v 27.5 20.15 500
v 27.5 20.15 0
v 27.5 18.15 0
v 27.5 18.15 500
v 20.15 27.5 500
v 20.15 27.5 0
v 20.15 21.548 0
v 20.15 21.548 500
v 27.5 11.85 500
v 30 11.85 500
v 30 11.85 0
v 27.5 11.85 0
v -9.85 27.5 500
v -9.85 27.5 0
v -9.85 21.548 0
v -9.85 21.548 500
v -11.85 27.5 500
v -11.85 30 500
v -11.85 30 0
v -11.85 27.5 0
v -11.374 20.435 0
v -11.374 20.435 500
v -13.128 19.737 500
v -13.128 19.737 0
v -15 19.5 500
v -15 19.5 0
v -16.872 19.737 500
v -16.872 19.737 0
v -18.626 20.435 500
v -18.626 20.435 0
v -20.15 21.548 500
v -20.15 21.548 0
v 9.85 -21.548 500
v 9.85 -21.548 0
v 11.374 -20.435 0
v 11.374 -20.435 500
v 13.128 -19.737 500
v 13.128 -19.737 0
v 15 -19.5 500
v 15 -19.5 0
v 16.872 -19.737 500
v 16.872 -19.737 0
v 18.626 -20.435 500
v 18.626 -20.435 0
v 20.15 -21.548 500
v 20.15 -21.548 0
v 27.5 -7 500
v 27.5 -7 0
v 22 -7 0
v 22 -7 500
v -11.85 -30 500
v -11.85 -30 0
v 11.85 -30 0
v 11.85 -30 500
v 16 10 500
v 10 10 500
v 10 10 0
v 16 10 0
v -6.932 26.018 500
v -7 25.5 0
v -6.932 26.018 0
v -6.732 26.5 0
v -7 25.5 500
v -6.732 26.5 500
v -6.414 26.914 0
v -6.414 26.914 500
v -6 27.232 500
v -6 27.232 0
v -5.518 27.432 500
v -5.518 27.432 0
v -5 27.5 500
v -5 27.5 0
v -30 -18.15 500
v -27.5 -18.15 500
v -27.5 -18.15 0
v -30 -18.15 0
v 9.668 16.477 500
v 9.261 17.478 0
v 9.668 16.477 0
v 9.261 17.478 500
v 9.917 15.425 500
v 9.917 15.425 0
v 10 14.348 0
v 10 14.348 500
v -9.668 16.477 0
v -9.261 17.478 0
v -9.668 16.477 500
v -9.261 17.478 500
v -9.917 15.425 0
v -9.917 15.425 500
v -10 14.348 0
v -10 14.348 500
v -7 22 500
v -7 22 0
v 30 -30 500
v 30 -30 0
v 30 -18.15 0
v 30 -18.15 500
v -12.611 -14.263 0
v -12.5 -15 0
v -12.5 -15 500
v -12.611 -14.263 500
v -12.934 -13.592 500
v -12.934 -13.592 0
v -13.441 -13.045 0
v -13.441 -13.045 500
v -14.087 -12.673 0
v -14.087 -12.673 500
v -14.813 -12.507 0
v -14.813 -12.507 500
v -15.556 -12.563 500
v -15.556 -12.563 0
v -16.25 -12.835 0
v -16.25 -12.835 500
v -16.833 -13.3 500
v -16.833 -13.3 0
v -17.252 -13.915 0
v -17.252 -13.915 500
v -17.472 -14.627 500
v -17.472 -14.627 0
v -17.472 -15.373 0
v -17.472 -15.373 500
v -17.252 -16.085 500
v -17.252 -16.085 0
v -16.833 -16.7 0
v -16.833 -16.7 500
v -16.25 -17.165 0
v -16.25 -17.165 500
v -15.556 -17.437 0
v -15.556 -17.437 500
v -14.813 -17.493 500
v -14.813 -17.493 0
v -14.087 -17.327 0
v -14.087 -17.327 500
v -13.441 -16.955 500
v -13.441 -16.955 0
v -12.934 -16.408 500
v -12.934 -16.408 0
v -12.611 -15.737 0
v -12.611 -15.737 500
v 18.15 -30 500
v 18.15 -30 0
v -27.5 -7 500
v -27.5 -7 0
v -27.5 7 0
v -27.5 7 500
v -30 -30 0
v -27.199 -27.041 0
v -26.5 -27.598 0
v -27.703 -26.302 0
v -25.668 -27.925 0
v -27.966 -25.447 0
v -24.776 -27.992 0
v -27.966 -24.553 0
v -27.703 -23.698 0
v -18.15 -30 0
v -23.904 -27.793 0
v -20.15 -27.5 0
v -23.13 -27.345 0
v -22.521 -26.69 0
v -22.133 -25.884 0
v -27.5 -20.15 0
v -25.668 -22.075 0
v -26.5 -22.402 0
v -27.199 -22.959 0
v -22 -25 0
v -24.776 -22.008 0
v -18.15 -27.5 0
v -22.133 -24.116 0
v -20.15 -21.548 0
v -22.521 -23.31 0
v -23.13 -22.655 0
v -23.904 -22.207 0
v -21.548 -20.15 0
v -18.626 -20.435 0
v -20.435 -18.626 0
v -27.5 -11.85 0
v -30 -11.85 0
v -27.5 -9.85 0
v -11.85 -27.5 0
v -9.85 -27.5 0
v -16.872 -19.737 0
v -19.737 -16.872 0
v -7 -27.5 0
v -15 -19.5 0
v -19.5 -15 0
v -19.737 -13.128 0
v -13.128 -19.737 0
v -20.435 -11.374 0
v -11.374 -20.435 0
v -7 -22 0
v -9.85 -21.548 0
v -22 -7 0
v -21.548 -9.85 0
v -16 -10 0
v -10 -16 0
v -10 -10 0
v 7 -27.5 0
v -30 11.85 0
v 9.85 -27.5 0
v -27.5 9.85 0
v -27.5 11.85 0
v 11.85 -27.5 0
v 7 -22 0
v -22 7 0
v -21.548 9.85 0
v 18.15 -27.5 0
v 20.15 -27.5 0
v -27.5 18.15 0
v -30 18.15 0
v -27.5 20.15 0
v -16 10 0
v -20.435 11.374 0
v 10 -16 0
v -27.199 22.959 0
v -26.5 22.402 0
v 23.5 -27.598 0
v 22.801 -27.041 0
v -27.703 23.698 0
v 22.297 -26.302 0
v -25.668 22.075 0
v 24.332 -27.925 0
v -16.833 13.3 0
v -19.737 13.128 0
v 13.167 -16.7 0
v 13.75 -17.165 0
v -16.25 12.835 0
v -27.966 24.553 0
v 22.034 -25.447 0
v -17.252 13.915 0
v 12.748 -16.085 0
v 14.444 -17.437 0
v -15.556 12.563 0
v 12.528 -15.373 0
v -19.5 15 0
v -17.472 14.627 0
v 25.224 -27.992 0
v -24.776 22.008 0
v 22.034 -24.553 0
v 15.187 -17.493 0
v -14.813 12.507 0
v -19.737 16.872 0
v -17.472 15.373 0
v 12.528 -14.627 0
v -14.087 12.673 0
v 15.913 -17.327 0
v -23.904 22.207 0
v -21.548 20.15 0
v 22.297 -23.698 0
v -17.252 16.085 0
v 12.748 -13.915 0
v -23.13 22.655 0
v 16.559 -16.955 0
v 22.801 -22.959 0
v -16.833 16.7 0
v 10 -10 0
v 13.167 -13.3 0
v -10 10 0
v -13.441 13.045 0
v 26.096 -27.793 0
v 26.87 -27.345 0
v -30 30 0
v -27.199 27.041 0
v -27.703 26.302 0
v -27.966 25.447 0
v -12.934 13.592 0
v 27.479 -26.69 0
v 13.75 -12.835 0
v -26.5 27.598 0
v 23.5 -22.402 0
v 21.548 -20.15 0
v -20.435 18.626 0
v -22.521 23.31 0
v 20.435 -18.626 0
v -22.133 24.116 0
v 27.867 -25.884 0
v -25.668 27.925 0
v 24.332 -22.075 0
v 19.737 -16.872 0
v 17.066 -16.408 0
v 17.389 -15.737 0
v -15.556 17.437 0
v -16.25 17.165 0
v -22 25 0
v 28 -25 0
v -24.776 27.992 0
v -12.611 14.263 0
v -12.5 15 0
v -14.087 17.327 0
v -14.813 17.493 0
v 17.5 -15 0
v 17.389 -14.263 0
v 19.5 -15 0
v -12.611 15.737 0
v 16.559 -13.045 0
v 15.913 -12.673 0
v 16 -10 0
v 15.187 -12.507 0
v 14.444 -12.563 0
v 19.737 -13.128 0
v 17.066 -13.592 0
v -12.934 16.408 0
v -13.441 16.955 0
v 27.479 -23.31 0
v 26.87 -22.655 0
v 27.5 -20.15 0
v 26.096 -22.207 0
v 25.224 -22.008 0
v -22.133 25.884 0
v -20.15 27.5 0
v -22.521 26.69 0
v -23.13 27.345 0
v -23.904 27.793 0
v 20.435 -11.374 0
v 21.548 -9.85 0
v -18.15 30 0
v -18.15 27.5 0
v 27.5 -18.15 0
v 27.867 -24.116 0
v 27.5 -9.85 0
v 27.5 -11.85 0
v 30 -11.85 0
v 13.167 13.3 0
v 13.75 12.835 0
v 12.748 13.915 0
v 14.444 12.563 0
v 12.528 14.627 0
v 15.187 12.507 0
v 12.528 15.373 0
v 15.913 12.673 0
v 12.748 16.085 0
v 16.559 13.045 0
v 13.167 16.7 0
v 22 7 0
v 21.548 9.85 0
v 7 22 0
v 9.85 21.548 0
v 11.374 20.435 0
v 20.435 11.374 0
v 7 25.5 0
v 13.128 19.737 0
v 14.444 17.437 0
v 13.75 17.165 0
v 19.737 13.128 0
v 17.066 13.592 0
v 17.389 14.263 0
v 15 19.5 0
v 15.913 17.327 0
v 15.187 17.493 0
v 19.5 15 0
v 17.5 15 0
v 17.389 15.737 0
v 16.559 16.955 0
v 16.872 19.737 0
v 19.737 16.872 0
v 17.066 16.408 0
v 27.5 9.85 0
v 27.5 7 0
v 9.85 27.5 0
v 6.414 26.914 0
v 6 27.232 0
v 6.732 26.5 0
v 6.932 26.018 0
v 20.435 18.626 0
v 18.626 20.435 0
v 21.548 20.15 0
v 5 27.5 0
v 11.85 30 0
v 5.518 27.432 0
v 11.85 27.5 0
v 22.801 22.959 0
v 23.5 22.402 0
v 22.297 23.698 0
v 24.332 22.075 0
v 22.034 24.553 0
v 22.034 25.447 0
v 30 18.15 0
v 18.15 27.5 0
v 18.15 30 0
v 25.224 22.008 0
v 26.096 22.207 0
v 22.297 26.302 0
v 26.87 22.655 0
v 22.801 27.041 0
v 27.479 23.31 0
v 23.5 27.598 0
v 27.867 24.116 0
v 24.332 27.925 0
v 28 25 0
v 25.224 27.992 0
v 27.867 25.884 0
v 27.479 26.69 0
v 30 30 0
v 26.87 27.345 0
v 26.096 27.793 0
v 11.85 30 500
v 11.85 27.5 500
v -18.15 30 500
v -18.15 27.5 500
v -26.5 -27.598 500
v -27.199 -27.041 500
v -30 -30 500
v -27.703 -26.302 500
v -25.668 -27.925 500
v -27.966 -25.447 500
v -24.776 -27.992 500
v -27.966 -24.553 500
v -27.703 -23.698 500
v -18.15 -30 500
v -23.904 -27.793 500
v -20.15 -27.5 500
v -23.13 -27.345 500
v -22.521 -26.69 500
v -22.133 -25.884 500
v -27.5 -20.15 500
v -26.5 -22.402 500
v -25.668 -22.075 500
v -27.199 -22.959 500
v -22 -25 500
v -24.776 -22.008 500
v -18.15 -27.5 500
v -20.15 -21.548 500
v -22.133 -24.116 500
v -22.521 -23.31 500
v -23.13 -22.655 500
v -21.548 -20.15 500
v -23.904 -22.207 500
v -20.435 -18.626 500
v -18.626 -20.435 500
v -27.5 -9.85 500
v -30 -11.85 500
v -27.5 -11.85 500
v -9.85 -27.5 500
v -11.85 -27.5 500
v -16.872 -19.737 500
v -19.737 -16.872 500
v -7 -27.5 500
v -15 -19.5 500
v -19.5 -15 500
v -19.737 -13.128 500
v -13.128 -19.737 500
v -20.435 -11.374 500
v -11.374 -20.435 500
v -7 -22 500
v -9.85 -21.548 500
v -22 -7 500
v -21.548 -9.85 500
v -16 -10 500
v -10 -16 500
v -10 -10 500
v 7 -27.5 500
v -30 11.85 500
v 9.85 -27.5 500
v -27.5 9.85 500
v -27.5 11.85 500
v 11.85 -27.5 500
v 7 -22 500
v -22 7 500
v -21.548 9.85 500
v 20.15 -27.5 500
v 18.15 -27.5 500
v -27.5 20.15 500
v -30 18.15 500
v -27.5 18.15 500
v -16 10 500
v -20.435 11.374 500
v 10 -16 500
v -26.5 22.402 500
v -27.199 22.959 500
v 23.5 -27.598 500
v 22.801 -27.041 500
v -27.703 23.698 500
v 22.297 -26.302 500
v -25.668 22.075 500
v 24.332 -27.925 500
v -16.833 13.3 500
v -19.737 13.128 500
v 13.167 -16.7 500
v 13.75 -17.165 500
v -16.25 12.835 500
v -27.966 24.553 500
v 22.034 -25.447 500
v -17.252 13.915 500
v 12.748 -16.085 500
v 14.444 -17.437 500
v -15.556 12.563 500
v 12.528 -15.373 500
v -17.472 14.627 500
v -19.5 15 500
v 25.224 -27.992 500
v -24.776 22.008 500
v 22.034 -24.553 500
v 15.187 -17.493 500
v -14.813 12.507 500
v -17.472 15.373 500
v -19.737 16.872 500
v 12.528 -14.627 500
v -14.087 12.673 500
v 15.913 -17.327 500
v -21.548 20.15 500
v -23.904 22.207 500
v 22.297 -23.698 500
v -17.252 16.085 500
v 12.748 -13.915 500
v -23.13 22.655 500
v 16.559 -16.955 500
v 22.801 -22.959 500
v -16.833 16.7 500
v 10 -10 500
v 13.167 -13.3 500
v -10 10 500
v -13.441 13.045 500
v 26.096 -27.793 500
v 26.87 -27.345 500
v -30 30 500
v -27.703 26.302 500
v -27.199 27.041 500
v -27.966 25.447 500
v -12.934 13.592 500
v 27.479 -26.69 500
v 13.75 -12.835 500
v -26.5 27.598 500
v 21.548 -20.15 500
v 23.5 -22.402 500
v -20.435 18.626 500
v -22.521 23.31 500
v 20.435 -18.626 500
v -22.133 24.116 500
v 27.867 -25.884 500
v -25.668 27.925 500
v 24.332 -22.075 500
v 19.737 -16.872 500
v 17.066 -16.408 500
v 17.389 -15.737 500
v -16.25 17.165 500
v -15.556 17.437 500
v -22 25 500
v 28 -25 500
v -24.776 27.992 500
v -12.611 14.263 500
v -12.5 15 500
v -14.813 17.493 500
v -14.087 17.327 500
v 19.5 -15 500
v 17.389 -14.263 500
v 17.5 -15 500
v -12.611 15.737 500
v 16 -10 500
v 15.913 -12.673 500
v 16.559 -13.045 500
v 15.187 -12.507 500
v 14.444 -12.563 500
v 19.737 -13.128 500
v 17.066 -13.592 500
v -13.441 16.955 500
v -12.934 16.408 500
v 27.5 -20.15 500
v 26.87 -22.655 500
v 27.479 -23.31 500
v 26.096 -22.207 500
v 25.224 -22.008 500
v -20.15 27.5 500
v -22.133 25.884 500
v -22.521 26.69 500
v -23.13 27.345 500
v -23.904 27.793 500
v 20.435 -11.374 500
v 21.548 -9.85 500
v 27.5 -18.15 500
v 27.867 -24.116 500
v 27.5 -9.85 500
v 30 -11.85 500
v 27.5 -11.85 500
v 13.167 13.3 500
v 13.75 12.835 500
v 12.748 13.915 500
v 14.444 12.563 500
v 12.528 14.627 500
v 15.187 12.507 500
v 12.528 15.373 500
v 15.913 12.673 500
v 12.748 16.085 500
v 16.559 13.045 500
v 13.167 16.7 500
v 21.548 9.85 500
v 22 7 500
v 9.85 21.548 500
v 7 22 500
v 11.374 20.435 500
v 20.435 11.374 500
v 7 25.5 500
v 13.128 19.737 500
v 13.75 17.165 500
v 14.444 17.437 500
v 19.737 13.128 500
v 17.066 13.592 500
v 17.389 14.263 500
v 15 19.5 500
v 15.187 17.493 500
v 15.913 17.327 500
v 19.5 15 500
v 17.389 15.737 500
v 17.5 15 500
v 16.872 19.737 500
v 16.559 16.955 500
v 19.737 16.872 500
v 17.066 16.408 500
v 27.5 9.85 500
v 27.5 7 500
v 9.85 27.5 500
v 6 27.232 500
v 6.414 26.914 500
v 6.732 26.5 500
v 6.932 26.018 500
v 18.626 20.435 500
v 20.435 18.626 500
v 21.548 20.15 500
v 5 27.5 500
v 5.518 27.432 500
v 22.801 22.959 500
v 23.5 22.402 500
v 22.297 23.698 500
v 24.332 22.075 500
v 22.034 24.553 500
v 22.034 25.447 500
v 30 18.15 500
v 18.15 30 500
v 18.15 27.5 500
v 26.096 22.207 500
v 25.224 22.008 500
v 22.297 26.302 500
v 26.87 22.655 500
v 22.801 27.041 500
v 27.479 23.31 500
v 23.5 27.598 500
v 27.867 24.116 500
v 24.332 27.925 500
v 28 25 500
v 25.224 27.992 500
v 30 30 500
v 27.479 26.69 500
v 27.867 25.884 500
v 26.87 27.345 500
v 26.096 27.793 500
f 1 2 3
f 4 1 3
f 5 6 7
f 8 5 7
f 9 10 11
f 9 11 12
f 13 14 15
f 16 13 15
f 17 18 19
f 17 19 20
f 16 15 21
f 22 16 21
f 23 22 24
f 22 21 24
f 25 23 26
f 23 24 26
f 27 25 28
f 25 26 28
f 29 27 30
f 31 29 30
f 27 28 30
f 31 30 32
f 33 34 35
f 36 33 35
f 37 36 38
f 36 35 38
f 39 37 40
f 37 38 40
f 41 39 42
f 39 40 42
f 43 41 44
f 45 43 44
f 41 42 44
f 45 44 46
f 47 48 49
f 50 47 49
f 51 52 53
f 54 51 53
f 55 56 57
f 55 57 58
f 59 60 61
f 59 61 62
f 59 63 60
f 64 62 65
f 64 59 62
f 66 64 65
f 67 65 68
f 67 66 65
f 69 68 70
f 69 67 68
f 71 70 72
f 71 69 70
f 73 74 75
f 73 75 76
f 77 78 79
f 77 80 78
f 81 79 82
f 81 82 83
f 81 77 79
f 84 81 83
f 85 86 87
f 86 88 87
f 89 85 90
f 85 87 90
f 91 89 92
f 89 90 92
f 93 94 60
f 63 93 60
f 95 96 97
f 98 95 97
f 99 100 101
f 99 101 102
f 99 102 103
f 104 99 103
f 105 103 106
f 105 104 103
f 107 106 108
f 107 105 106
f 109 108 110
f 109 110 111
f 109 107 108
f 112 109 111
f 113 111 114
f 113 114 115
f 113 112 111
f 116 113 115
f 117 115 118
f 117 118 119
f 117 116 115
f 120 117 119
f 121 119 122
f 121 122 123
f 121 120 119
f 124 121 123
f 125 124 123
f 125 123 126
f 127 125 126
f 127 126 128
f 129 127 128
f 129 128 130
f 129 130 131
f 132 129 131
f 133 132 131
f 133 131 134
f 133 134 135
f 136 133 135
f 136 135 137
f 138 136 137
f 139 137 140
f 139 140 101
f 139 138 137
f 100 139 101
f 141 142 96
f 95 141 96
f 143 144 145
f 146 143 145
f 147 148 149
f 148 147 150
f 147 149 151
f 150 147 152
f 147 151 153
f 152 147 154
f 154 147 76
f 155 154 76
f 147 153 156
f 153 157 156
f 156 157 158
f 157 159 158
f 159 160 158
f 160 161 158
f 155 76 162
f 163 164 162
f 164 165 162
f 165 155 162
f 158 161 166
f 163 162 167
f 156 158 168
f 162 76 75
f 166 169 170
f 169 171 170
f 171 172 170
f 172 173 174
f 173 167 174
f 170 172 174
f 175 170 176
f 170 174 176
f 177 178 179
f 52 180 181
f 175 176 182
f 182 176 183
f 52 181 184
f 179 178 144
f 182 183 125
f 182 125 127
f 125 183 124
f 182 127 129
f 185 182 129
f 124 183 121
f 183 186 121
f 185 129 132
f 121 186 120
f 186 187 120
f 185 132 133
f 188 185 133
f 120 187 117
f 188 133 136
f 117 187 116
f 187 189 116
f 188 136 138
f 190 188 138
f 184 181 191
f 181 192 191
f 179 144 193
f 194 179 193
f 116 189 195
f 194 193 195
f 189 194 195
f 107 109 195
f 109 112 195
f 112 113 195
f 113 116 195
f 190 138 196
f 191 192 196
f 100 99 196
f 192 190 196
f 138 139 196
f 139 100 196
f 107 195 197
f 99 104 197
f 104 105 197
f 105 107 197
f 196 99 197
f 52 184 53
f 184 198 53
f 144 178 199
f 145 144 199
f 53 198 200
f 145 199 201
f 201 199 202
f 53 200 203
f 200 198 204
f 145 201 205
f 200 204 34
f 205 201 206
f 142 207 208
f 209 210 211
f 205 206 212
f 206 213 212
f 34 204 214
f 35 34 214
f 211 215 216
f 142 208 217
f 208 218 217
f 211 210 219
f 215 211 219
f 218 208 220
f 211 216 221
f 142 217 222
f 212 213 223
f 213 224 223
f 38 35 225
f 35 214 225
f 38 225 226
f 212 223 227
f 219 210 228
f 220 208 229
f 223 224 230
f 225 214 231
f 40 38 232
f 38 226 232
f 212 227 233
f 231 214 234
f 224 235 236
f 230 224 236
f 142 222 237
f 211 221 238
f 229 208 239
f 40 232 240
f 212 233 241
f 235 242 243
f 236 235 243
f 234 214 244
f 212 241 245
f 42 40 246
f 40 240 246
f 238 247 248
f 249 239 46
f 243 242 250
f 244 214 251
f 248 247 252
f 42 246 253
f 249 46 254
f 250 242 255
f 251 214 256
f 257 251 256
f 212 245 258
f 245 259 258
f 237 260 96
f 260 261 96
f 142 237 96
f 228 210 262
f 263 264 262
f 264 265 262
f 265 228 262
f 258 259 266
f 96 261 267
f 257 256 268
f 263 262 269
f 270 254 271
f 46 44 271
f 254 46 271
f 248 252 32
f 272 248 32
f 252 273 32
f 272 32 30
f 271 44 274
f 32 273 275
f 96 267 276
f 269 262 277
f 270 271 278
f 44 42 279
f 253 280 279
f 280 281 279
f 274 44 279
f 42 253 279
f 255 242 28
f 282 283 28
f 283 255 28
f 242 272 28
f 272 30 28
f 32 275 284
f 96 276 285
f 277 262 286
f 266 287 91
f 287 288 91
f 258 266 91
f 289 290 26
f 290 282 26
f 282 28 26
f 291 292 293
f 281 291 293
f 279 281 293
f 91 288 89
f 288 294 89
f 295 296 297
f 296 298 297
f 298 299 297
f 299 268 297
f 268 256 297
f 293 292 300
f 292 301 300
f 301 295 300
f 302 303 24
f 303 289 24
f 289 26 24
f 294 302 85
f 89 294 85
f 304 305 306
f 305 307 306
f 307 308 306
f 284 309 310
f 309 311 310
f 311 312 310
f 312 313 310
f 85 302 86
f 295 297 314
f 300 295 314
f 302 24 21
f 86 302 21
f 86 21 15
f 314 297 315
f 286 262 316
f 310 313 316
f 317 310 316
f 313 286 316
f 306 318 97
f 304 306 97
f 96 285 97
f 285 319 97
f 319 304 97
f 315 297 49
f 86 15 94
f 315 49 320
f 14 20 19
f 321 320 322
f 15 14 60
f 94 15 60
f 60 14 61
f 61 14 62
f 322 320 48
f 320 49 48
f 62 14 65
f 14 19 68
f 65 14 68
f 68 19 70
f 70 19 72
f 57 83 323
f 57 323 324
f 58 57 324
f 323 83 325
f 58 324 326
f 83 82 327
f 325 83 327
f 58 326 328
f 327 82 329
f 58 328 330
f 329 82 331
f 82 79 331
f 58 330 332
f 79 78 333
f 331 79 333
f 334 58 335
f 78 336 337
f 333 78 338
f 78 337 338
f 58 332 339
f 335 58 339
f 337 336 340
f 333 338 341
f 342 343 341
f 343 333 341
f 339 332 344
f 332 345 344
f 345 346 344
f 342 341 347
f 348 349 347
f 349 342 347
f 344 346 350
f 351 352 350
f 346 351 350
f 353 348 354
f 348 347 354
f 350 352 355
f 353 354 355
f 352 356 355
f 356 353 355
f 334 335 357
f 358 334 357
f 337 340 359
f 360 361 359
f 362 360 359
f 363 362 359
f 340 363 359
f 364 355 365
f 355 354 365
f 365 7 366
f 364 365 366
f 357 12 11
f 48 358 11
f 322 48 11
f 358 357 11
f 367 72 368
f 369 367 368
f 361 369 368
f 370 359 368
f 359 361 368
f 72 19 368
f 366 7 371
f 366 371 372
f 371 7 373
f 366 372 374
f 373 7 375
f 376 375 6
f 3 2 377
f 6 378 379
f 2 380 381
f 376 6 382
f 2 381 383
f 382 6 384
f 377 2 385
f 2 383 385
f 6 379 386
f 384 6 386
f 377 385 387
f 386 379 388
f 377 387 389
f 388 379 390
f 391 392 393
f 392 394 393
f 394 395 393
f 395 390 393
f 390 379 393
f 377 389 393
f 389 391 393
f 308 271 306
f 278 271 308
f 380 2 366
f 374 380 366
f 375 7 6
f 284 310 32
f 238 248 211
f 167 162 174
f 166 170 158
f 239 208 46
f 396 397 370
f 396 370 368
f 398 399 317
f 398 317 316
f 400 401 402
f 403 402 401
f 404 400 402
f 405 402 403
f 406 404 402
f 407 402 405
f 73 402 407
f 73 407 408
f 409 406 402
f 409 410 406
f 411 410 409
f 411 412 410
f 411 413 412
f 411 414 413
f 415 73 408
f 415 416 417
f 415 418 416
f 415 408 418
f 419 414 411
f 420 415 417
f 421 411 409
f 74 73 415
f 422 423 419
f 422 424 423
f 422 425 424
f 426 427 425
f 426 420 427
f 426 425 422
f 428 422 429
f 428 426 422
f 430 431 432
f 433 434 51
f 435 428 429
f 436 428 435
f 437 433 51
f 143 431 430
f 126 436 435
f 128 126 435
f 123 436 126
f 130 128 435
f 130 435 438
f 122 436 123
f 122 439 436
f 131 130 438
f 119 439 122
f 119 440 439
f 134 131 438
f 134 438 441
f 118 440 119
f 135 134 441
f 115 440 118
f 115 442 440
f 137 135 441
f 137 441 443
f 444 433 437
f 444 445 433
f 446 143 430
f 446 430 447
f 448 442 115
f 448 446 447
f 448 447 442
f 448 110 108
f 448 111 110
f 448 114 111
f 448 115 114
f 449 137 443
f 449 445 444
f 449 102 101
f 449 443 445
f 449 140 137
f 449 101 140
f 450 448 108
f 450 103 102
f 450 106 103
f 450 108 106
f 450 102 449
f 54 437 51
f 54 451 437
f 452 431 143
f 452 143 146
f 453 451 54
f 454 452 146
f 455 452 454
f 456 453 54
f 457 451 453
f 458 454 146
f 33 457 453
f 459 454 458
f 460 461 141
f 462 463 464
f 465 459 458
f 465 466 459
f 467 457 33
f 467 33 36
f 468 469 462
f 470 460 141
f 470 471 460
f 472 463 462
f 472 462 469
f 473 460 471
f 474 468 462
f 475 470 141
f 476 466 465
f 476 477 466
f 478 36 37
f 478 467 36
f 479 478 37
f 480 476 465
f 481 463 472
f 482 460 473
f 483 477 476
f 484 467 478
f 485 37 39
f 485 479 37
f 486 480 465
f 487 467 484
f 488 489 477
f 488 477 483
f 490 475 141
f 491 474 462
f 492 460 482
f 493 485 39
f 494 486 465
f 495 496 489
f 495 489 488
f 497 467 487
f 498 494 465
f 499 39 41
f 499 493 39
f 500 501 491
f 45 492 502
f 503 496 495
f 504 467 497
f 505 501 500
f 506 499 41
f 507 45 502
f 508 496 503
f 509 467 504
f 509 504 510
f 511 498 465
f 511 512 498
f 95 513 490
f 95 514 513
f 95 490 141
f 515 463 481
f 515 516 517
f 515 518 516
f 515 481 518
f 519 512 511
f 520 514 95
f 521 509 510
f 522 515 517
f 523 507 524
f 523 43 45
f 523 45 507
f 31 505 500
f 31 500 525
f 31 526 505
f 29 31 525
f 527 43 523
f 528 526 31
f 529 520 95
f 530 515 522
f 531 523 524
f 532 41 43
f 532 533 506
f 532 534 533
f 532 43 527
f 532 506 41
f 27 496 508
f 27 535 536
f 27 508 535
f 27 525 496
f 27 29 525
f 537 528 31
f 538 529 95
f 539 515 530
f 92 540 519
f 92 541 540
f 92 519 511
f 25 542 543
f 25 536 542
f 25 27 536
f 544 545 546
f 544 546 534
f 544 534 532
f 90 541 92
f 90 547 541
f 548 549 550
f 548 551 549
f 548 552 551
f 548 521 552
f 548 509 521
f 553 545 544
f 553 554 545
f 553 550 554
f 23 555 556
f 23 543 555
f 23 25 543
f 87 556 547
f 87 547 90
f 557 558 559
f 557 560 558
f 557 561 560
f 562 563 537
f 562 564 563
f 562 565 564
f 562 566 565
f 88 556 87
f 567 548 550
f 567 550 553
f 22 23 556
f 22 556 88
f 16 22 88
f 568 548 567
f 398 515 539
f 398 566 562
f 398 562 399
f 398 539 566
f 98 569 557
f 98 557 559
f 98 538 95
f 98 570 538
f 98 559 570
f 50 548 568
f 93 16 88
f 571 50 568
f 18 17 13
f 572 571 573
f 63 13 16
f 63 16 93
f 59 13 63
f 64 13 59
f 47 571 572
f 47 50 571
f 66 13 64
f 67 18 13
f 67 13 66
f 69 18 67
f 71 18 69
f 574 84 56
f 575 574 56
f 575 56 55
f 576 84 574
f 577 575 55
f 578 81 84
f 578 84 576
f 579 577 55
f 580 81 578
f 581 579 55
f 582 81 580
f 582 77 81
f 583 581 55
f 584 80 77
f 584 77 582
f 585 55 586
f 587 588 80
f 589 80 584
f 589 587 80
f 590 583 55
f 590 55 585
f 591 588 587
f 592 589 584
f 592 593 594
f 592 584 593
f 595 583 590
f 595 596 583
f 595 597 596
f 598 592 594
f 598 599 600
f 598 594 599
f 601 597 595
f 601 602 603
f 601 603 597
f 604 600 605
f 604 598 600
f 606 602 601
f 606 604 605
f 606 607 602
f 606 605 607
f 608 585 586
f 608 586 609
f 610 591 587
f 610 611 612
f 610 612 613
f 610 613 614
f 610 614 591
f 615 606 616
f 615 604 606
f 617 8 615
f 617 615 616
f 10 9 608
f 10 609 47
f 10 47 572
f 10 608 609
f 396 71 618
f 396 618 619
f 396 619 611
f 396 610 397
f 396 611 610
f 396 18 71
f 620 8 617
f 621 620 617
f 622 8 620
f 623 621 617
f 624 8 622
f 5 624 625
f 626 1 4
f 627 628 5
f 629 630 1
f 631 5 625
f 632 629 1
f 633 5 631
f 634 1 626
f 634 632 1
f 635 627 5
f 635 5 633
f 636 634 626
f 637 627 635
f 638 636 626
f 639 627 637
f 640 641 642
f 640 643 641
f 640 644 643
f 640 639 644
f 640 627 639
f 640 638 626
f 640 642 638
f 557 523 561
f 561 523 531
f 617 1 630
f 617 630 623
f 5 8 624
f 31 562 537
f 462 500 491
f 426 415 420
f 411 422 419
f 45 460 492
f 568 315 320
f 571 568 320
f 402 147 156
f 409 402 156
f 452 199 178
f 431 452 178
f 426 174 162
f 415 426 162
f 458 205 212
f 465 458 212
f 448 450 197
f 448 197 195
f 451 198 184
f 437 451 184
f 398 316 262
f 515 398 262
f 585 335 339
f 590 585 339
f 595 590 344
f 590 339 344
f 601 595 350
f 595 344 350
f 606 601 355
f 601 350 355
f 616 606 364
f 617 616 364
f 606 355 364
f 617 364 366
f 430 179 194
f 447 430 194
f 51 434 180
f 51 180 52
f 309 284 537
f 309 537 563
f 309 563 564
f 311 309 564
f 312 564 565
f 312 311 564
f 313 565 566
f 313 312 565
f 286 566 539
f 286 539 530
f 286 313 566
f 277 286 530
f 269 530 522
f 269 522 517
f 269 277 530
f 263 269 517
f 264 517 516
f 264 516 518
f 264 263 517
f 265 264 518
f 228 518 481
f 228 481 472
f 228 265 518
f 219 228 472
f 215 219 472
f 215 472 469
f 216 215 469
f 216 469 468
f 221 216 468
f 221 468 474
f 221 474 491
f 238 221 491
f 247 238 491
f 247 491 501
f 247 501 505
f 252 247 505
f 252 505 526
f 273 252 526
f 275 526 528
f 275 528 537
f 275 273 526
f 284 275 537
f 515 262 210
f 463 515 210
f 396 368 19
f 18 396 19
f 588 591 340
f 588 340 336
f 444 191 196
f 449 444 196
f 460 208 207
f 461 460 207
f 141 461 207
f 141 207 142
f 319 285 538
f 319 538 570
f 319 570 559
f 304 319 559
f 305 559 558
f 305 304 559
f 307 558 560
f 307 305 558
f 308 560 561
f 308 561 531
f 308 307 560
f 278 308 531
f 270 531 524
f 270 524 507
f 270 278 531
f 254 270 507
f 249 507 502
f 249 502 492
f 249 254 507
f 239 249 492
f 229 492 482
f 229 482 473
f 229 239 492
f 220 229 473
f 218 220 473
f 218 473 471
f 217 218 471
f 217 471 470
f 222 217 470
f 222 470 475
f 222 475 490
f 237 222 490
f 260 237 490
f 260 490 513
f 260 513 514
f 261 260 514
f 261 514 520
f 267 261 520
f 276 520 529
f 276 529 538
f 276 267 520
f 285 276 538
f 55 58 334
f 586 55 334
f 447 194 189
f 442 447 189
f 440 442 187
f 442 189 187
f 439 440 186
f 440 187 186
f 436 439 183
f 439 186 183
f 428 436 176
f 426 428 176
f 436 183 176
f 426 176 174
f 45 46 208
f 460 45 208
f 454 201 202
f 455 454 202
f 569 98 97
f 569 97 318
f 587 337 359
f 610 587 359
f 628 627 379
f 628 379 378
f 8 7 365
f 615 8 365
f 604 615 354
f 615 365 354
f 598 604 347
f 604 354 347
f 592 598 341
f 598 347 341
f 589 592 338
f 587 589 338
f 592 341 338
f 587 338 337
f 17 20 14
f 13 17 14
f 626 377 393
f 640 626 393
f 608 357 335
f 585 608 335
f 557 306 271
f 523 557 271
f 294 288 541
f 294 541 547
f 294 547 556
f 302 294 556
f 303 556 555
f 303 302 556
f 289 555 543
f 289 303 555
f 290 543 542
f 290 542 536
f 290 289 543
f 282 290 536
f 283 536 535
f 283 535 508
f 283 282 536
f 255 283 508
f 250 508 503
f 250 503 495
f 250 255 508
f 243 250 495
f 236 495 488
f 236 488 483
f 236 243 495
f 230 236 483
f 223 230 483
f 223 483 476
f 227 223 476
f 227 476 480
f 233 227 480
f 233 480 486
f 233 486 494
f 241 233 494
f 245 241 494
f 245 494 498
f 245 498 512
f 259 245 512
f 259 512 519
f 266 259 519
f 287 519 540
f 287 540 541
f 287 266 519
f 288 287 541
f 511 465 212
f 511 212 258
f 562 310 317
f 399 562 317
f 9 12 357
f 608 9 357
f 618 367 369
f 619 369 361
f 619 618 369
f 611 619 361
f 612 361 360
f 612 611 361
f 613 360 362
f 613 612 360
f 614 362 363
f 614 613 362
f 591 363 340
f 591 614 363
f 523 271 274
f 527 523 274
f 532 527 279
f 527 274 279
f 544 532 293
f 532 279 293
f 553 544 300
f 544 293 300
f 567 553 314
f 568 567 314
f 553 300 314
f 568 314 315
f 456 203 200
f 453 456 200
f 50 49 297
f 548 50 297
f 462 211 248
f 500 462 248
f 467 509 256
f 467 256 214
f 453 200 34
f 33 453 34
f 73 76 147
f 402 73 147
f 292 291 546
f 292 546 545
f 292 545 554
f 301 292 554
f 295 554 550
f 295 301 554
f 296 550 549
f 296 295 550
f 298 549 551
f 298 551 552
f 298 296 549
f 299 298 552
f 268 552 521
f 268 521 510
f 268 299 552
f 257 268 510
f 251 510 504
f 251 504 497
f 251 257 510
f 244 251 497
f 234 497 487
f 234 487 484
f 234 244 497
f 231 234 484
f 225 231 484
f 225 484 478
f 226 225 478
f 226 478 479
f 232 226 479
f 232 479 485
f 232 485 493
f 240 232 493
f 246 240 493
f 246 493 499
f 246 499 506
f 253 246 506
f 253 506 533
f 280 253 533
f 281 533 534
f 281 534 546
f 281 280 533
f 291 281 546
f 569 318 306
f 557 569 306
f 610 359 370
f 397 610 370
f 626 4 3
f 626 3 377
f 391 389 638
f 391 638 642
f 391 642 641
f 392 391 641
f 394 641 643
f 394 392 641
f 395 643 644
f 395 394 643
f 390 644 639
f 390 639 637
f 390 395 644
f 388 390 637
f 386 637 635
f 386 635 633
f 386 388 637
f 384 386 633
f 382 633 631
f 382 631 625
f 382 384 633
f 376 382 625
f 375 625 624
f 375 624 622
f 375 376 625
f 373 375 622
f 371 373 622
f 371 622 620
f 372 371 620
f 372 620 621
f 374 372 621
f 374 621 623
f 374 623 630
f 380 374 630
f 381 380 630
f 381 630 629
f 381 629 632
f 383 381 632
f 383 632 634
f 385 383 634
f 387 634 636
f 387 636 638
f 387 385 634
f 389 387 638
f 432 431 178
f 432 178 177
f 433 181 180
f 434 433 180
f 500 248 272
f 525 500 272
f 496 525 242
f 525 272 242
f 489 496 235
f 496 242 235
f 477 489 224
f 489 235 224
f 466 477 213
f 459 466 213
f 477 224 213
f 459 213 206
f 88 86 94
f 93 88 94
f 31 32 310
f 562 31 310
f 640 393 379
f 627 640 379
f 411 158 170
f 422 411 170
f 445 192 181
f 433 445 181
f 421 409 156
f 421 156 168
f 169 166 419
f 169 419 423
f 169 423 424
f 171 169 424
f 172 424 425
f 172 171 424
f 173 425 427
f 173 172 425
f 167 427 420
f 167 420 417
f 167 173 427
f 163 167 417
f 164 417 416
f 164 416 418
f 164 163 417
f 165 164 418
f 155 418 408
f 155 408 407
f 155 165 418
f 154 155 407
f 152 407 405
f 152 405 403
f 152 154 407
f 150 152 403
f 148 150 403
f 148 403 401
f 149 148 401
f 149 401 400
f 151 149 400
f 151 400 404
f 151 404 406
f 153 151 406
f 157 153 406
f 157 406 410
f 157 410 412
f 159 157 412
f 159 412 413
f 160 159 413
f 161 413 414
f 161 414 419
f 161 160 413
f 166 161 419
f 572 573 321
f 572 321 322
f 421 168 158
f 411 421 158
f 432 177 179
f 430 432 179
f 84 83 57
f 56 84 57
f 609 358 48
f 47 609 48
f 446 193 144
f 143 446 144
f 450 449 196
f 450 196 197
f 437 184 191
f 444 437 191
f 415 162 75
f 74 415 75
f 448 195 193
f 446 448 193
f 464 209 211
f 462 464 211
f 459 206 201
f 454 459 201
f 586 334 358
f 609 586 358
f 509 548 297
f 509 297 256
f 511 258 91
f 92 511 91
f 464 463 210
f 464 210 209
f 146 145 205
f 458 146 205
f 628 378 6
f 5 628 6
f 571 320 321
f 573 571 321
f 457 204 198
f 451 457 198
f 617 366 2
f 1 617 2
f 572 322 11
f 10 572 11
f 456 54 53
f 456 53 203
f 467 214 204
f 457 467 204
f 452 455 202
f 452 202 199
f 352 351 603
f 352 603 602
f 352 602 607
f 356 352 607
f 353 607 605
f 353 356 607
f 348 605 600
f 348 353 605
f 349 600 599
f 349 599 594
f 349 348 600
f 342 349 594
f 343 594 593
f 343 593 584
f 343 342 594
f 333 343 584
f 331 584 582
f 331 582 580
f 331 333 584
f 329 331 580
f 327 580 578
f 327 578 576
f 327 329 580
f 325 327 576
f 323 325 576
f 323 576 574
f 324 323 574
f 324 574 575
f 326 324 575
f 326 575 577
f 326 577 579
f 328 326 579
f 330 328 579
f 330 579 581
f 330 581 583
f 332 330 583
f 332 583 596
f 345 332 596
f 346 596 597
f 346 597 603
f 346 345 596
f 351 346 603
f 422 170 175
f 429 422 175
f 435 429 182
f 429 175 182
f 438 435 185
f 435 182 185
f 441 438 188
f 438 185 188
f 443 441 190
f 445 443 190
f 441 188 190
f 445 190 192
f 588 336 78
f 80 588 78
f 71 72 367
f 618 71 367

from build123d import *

# Parameters (mm, degrees)
F0_R     = 3
F0_R_2   = 2.5
F1_DEPTH = 500
F2_R     = 2
F3_R     = 7


# Not quite as in the source:
# - a feature names something its author has since deleted; it is built from what else it names


with BuildPart() as f1:
    # F0 (on Top) → F1 (new body)
    with BuildSketch(Plane.XY):
        with BuildLine():
            Line((18.15, -30), (30, -30))
            Line((30, -30), (30, -18.15))
            Line((30, -18.15), (27.5, -18.15))
            Line((27.5, -18.15), (27.5, -20.15))
            Line((27.5, -20.15), (21.5477069044, -20.15))
            ThreePointArc((21.5477069044, -20.15), (19.5, -15), (21.5477069044, -9.85))
            Line((21.5477069044, -9.85), (27.5, -9.85))
            Line((27.5, -9.85), (27.5, -11.85))
            Line((27.5, -11.85), (30, -11.85))
            Line((30, -11.85), (30, 11.85))
            Line((30, 11.85), (27.5, 11.85))
            Line((27.5, 11.85), (27.5, 9.85))
            Line((27.5, 9.85), (21.5477069044, 9.85))
            ThreePointArc((21.5477069044, 9.85), (19.5, 15), (21.5477069044, 20.15))
            Line((21.5477069044, 20.15), (27.5, 20.15))
            Line((27.5, 20.15), (27.5, 18.15))
            Line((27.5, 18.15), (30, 18.15))
            Line((30, 18.15), (30, 30))
            Line((30, 30), (18.15, 30))
            Line((18.15, 30), (18.15, 27.5))
            Line((18.15, 27.5), (20.15, 27.5))
            Line((20.15, 27.5), (20.15, 21.5477069044))
            ThreePointArc((20.15, 21.5477069044), (15, 19.5), (9.85, 21.5477069044))
            Line((9.85, 21.5477069044), (9.85, 27.5))
            Line((9.85, 27.5), (11.85, 27.5))
            Line((11.85, 27.5), (11.85, 30))
            Line((11.85, 30), (-11.85, 30))
            Line((-11.85, 30), (-11.85, 27.5))
            Line((-11.85, 27.5), (-9.85, 27.5))
            Line((-9.85, 27.5), (-9.85, 21.5477069044))
            ThreePointArc((-9.85, 21.5477069044), (-15, 19.5), (-20.15, 21.5477069044))
            Line((-20.15, 21.5477069044), (-20.15, 27.5))
            Line((-20.15, 27.5), (-18.15, 27.5))
            Line((-18.15, 27.5), (-18.15, 30))
            Line((-18.15, 30), (-30, 30))
            Line((-30, 30), (-30, 18.15))
            Line((-30, 18.15), (-27.5, 18.15))
            Line((-27.5, 18.15), (-27.5, 20.15))
            Line((-27.5, 20.15), (-21.5477069044, 20.15))
            ThreePointArc((-21.5477069044, 20.15), (-19.5, 15), (-21.5477069044, 9.85))
            Line((-21.5477069044, 9.85), (-27.5, 9.85))
            Line((-27.5, 9.85), (-27.5, 11.85))
            Line((-27.5, 11.85), (-30, 11.85))
            Line((-30, 11.85), (-30, -11.85))
            Line((-30, -11.85), (-27.5, -11.85))
            Line((-27.5, -11.85), (-27.5, -9.85))
            Line((-27.5, -9.85), (-21.5477069044, -9.85))
            ThreePointArc((-21.5477069044, -9.85), (-19.5, -15), (-21.5477069044, -20.15))
            Line((-21.5477069044, -20.15), (-27.5, -20.15))
            Line((-27.5, -20.15), (-27.5, -18.15))
            Line((-27.5, -18.15), (-30, -18.15))
            Line((-30, -18.15), (-30, -30))
            Line((-30, -30), (-18.15, -30))
            Line((-18.15, -30), (-18.15, -27.5))
            Line((-18.15, -27.5), (-20.15, -27.5))
            Line((-20.15, -27.5), (-20.15, -21.5477069044))
            ThreePointArc((-20.15, -21.5477069044), (-15, -19.5), (-9.85, -21.5477069044))
            Line((-9.85, -21.5477069044), (-9.85, -27.5))
            Line((-9.85, -27.5), (-11.85, -27.5))
            Line((-11.85, -27.5), (-11.85, -30))
            Line((-11.85, -30), (11.85, -30))
            Line((11.85, -30), (11.85, -27.5))
            Line((11.85, -27.5), (9.85, -27.5))
            Line((9.85, -27.5), (9.85, -21.5477069044))
            ThreePointArc((9.85, -21.5477069044), (15, -19.5), (20.15, -21.5477069044))
            Line((20.15, -21.5477069044), (20.15, -27.5))
            Line((20.15, -27.5), (18.15, -27.5))
            Line((18.15, -27.5), (18.15, -30))
        make_face()
        with Locations((-25, -25)):
            Circle(F0_R, mode=Mode.SUBTRACT)
        with Locations((-15, -15)):
            Circle(F0_R_2, mode=Mode.SUBTRACT)
        with Locations((25, -25)):
            Circle(F0_R, mode=Mode.SUBTRACT)
        with Locations((15, -15)):
            Circle(F0_R_2, mode=Mode.SUBTRACT)
        with Locations((-25, 25)):
            Circle(F0_R, mode=Mode.SUBTRACT)
        with Locations((-15, 15)):
            Circle(F0_R_2, mode=Mode.SUBTRACT)
        Polygon((-7, 22), (-7, 27.5), (0, 27.5), (7, 27.5), (7, 22), (10, 16), (10, 10), (16, 10), (22, 7), (27.5, 7), (27.5, 0), (27.5, -7), (22, -7), (16, -10), (10, -10), (10, -16), (7, -22), (7, -27.5), (0, -27.5), (-7, -27.5), (-7, -22), (-10, -16), (-10, -10), (-16, -10), (-22, -7), (-27.5, -7), (-27.5, 0), (-27.5, 7), (-22, 7), (-16, 10), (-10, 10), (-10, 16), align=None, mode=Mode.SUBTRACT)
        with Locations((15, 15)):
            Circle(F0_R_2, mode=Mode.SUBTRACT)
        with Locations((25, 25)):
            Circle(F0_R, mode=Mode.SUBTRACT)
    extrude(amount=F1_DEPTH)

    # F2
    f2_edges = [f1.edges().sort_by_distance(p)[0] for p in [
        (-7, 27.5, 250),
        (7, 27.5, 250),
    ]]
    fillet(f2_edges, radius=F2_R)

    # F3
    f3_edges = [f1.edges().sort_by_distance(p)[0] for p in [
        (-10, 16, 250),
        (10, 16, 250),
    ]]
    fillet(f3_edges, radius=F3_R)


solid = f1.part
